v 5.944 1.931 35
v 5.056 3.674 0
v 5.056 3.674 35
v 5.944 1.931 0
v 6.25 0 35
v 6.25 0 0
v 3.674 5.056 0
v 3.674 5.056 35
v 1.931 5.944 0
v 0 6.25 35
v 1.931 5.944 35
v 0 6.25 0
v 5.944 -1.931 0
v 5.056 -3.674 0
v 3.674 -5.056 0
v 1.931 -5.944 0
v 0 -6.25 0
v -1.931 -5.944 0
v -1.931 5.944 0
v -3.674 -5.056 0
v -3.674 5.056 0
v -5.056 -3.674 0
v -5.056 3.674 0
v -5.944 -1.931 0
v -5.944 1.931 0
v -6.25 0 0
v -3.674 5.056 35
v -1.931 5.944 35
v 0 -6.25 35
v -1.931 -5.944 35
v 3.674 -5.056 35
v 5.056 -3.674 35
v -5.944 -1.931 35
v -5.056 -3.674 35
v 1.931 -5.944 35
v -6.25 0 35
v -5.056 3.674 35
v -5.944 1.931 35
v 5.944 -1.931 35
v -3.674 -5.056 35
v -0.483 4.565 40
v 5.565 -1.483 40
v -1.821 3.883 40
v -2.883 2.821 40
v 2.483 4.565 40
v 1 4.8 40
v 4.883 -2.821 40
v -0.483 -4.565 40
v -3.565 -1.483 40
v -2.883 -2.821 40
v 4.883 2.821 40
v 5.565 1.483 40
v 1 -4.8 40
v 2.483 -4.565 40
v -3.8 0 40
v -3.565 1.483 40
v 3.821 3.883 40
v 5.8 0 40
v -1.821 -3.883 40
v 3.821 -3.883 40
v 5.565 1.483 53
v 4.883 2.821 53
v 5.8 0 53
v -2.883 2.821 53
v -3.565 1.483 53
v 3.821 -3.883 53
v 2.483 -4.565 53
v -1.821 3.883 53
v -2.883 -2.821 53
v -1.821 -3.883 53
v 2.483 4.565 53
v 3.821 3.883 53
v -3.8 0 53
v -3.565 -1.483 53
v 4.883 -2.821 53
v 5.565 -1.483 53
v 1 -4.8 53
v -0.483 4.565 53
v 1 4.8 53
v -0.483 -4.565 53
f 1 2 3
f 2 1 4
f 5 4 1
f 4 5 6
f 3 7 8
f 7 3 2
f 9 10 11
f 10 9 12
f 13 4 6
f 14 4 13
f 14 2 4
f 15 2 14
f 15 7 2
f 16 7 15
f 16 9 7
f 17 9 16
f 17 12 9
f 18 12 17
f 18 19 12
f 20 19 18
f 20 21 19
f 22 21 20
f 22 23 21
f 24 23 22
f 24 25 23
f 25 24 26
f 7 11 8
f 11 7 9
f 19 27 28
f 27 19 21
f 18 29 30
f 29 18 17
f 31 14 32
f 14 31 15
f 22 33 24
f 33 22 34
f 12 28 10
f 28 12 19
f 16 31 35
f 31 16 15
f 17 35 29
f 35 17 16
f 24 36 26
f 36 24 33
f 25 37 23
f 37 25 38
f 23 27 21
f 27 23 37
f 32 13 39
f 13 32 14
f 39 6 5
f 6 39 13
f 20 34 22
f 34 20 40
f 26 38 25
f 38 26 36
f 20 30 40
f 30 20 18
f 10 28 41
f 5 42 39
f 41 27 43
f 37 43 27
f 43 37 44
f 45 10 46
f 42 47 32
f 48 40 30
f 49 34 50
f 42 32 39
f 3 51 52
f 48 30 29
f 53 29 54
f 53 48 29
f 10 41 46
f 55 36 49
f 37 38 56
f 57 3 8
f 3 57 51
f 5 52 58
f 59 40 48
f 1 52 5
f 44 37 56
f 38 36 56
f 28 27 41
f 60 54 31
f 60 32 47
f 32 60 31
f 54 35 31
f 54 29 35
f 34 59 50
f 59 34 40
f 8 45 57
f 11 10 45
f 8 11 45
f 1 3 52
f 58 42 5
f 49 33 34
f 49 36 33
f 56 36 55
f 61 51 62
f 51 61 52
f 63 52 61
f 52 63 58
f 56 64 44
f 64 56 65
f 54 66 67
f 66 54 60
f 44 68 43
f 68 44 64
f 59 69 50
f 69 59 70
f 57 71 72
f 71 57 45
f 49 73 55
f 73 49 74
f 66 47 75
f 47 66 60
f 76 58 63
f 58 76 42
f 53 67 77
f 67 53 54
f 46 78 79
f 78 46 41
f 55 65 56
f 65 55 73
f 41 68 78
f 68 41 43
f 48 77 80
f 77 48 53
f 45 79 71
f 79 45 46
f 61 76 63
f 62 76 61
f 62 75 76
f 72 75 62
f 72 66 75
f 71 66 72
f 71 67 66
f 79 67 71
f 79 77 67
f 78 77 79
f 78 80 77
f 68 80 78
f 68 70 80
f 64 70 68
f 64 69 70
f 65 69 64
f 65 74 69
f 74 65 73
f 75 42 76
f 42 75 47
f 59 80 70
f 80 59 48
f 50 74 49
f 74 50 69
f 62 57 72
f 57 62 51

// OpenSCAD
// file: ../../lib/rounded_primitives.scad
// Rounded primitives for openscad
// (c) 2013 Wouter Robers

// Syntax example for a rounded block
//translate([-15,0,10]) rcube([20,20,20],2);

// Syntax example for a rounded cylinder
//translate([15,0,10]) rcylinder(r1=15,r2=10,h=20,b=2);




module rcube(Size=[20,20,20],b=2) {
    hull() {
        for (x=[-(Size[0]/2-b),(Size[0]/2-b)]){
            for (y=[-(Size[1]/2-b),(Size[1]/2-b)]) {
                for (z=[-(Size[2]/2-b),(Size[2]/2-b)]) {
                    translate([x,y,z])
                    sphere(b);
                }
            }
        }
    }
}


module rcylinder(r1=10, r2=10, h=10, b=2, center=false, fn=20) {
    t = center ? -h/2 : 0;
    translate([0,0,t])
    hull() {
        rotate_extrude()
            translate([r1-b,b,0])
            circle(r= b, $fn=fn);
        rotate_extrude()
            translate([r2-b, h-b, 0])
            circle(r= b, $fn=fn);
    }
}
// file: ../../lib/Morphology.scad
// Copyright (c) 2013 Oskar Linde. All rights reserved.
// License: BSD
//
// This library contains basic 2D morphology operations
//
// outset(d=1)            - creates a polygon at an offset d outside a 2D shape
// inset(d=1)             - creates a polygon at an offset d inside a 2D shape
// fillet(r=1)            - adds fillets of radius r to all concave corners of a 2D shape
// rounding(r=1)          - adds rounding to all convex corners of a 2D shape
// shell(d,center=false)  - makes a shell of width d along the edge of a 2D shape
//                        - positive values of d places the shell on the outside
//                        - negative values of d places the shell on the inside
//                        - center=true and positive d places the shell centered on the edge

module outset(d=1) {
    // Bug workaround for older OpenSCAD versions
    if (version_num() < 20130424) render() outset_extruded(d) children();
    else minkowski() {
        circle(r=d);
        children();
    }
}

module outset_extruded(d=1) {
   projection(cut=true) minkowski() {
        cylinder(r=d);
        linear_extrude(center=true) children();
   }
}

module inset(d=1) {
     render() inverse() outset(d=d) inverse() children();
}

module fillet(r=1) {
    inset(d=r) render() outset(d=r) children();
}

module rounding(r=1) {
    outset(d=r) inset(d=r) children();
}

module shell(d,center=false) {
    if (center && d > 0) {
        difference() {
            outset(d=d/2) children();
            inset(d=d/2) children();
        }
    }
    if (!center && d > 0) {
        difference() {
            outset(d=d) children();
            children();
        }
    }
    if (!center && d < 0) {
        difference() {
            children();
            inset(d=-d) children();
        }
    }
    if (d == 0) children();
}


// Below are for internal use only

module inverse() {
    difference() {
        square(1e5,center=true);
        children();
    }
}


// TEST CODE

// use <mirror.scad>

module arrow(l=1,w=.6,t=0.15) {
    mirror_y() polygon([[0,0],[l,0],[l-w/2,w/2],[l-w/2-sqrt(2)*t,w/2],[l-t/2-sqrt(2)*t,t/2],[0,t/2]]);
}

module shape() {
    polygon([[0,0],[1,0],[1.5,1],[2.5,1],[2,-1],[0,-1]]);
}

if(0) assign($fn=32) {

    for (p = [0:10*3-1]) assign(o=floor(p/3)) {
        translate([(p%3)*2.5,-o*3]) {
            //%if (p % 3 == 1) translate([0,0,1]) shape();
            if (p % 3 == 0) shape();
            if (p % 3 == 1) translate([0.6,0]) arrow();
            if (p % 3 == 2) {
                if (o == 0) inset(d=0.3) shape();
                if (o == 1) outset(d=0.3) shape();
                if (o == 2) rounding(r=0.3) shape();
                if (o == 3) fillet(r=0.3) shape();
                if (o == 4) shell(d=0.3) shape();
                if (o == 5) shell(d=-0.3) shape();
                if (o == 6) shell(d=0.3,center=true) shape();
                if (o == 7) rounding(r=0.3) fillet(r=0.3) shape();
                if (o == 8) shell(d=0.3,center=true) fillet(r=0.3) rounding(r=0.3) shape();
                if (o == 9) shell(d=-0.3) fillet(r=0.3) rounding(r=0.3) shape();
            }
        }
    }
}
// main file
// Grille remplissage formes

largeur = 200;
profondeur = 145;
epaisseurCadre = 15;
hauteurMontantCadre = 20;
largeurAttache = 30;
epaisseurRenfort = 3;

include <../../lib/Morphology.scad>;
include <../../lib/rounded_primitives.scad>;

// cadre();
// barre_grille();
// grille();
// attache_fond();
// translate([0,-40]) attache();
// rotate([-90])
// attache_oblong_pour_plot_tournant();

plot_tournant_pour_perceuse();

// attache_cables_electriques();

module attache_cables_electriques() {
    difference() {
        linear_extrude(height=5) {
            // $fn=33;
            rounding(r=5, $fn=33) square([18, 55]);
        }
        translate([4, 4]) cylinder(h=20, d=3.4, center=true, $fn=18);
        translate([14, 4]) cylinder(h=20, d=3.4, center=true, $fn=18);
        translate([3, 47]) cube(size=[2, 5, 20], center=true);
        translate([3, 33]) cube(size=[2, 5, 20], center=true);

    }
}

module plot_tournant_pour_perceuse() {
    diam_axe_mandrin = 12.5;
    diam_plot = 9.6;
    eccentrage = 1; // 3/2

    cylinder(h=30, d=diam_axe_mandrin, center=false, $fn=20);
    hull() {
    translate([0, 0, 29])
        cylinder(h=6, d=diam_axe_mandrin, center=false, $fn=20);
    translate([eccentrage, 0, 34])
        cylinder(h=6, d=diam_plot, center=false, $fn=20);
    }
    translate([eccentrage, 0, 39])
        cylinder(h=14, d=diam_plot, center=false, $fn=20);
}

module attache_oblong_pour_plot_tournant() {
    d = largeurAttache-2*epaisseurRenfort-2;
    difference() {
        hull() {
            linear_extrude(height=5) {
                rounding(r=5) square(largeurAttache);
            }
            translate([0, largeurAttache-5]) rotate([-90])
            linear_extrude(height=5) {
                rounding(r=5) square([largeurAttache,largeurAttache-4]);
            }
        }
        translate([d/2+epaisseurRenfort+1, d/2, -d])
            rcube(Size=[d,d,d*2],b=4);
        translate([largeurAttache/2, 7, -5]) cylinder(h=20, d=7);
        translate([largeurAttache/2-5.5, largeurAttache, -largeurAttache/2+4]) rotate([90, 90]) trou_oblong(d=10, longueur=11);
    }
}

module grille() {
    union() {
        cadre();
        barres();
        attache_fond();
        attache_droite();
        attache_gauche();
    }
}

module attache_gauche() {
    translate([-2, 45-largeurAttache]) rotate([0,0,90])
        attache();
}

module attache_droite() {
    translate([largeur+2, 45]) rotate([0,0,-90])
        attache();
}

module attache_fond() {
    translate([largeur/2-largeurAttache/2, profondeur+2])
        attache();
}

module attache() {
    difference() {
        union() {
           linear_extrude(height=5) {
                rounding(r=5) square(largeurAttache);
            }
            translate([largeurAttache-epaisseurRenfort, 0]) renfort_attache();
            renfort_attache();
        }
        translate([largeurAttache/2, 14]) trou_oblong();
    }
}

module renfort_attache() {
    hull() {
        cube(size=[epaisseurRenfort, largeurAttache-4, 4], center=false);
        cube(size=[epaisseurRenfort, 1, largeurAttache], center=false);
    }
}

module trou_oblong(d=7, longueur=7) {
    translate([0,0,-5])
    hull() {
        translate([0, longueur]) cylinder(h=20, d=d);
        cylinder(h=20, d=d);
    }
}

module cadre() {
    linear_extrude(height=hauteurMontantCadre+epaisseurCadre) {
        shell(d=4, center=false)
            rounding(r=5) square([largeur, profondeur]);
    }
}

module barres() {
    d = largeur/8;
    for (i = [1:7]) {
        translate([0 + i*d, 0]) barre_grille();
    }
}

module barre_grille() {
    translate([0,0,epaisseurCadre/2])
    scale([0.5, 1])
    rotate([0,-90, -90])
    cylinder(h=profondeur+2, r=epaisseurCadre, center=false, $fn=3);
}
